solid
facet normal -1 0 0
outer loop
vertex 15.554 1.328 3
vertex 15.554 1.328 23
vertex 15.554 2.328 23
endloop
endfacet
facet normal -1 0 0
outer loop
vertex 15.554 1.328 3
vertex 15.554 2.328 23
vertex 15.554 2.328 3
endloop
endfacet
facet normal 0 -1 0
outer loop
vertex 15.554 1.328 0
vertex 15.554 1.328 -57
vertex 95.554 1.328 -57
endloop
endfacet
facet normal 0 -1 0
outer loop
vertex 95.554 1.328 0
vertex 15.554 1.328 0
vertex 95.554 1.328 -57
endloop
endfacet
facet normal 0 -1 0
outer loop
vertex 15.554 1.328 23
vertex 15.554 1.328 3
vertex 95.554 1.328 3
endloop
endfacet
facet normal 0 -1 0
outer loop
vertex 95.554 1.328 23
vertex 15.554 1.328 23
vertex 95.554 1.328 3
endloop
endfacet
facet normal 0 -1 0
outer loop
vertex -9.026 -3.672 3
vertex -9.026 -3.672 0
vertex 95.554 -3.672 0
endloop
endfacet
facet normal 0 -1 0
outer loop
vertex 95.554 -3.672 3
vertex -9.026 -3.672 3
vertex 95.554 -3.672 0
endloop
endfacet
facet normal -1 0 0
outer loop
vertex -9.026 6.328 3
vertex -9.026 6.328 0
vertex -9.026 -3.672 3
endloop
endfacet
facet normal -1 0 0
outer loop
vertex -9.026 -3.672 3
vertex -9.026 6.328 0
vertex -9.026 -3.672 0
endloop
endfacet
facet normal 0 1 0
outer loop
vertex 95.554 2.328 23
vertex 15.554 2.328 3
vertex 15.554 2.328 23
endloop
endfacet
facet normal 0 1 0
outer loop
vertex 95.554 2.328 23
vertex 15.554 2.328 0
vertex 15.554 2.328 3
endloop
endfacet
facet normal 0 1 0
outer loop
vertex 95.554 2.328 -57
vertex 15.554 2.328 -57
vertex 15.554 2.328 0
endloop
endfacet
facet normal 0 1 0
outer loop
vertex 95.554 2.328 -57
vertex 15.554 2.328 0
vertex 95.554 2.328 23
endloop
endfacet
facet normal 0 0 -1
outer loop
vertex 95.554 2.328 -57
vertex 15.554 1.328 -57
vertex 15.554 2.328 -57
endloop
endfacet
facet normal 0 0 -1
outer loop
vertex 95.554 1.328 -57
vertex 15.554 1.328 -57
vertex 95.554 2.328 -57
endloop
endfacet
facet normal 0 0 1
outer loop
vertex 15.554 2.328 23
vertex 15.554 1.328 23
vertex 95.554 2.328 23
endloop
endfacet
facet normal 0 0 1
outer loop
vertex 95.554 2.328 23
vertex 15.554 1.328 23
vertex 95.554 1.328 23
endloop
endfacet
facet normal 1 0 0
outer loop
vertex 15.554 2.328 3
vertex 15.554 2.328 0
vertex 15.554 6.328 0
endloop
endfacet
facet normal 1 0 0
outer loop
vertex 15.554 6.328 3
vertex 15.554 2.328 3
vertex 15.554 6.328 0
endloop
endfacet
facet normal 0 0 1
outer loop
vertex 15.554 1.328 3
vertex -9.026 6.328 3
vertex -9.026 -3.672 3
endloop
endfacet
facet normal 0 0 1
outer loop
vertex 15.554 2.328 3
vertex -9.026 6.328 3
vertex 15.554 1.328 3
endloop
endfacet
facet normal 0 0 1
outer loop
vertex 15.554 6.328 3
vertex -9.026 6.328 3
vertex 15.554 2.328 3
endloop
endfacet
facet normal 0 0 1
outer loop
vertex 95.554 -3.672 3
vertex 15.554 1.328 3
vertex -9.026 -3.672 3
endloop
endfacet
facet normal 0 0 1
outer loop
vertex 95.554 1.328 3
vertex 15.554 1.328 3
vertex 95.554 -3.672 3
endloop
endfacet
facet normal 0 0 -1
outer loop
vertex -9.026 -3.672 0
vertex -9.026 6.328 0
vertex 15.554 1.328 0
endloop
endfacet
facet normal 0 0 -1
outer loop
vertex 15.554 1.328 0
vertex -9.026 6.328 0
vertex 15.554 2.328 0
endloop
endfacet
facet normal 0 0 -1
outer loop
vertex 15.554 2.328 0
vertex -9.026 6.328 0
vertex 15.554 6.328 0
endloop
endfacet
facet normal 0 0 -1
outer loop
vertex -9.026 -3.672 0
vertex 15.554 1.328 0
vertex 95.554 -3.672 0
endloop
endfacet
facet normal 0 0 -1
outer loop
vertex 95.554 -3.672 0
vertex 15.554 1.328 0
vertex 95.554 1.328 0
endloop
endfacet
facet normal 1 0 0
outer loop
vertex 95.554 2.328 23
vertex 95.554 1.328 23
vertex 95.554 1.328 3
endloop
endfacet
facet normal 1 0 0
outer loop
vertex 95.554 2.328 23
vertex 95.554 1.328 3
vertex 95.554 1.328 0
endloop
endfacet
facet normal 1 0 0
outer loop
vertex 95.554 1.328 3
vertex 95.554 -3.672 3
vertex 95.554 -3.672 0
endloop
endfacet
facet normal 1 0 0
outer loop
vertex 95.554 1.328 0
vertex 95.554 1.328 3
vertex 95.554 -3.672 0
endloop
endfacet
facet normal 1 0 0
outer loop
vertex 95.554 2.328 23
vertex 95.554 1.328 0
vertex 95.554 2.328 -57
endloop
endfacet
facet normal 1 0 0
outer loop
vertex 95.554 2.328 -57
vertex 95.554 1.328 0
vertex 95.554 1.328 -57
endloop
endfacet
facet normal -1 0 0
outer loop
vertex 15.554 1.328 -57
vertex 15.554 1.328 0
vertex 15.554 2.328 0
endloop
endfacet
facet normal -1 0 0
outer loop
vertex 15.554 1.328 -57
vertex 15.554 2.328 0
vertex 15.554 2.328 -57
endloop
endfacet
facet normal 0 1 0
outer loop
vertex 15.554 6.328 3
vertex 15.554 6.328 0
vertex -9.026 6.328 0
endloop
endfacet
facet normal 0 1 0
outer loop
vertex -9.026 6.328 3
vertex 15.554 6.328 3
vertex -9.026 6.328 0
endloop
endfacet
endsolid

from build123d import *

# Parameters (mm, degrees)
BOSS_EXTRUDE3_DEPTH = 3
SKETCH4_W           = 80
SKETCH4_H           = 80
BOSS_EXTRUDE4_DEPTH = 1


with BuildPart() as part:
    # Sketch1 → Boss-Extrude3 (new body)
    with BuildSketch(Plane.XY):
        Polygon((15.553767031, 1.327814089), (15.553767031, 6.327814089), (-9.026232969, 6.327814089), (-9.026232969, -3.672185911), (5.238144653, -3.672185911), (95.553767031, -3.672185911), (95.553767031, 1.327814089), align=None)
    extrude(amount=BOSS_EXTRUDE3_DEPTH)

    # Sketch4 → Boss-Extrude4 (add)
    with BuildSketch(Plane(origin=(0, 1.327814089, 0), x_dir=(1, 0, 0), z_dir=(0, 1, 0))):
        with Locations((55.553767031, 17)):
            Rectangle(SKETCH4_W, SKETCH4_H)
    extrude(amount=BOSS_EXTRUDE4_DEPTH)


solid = part.part
